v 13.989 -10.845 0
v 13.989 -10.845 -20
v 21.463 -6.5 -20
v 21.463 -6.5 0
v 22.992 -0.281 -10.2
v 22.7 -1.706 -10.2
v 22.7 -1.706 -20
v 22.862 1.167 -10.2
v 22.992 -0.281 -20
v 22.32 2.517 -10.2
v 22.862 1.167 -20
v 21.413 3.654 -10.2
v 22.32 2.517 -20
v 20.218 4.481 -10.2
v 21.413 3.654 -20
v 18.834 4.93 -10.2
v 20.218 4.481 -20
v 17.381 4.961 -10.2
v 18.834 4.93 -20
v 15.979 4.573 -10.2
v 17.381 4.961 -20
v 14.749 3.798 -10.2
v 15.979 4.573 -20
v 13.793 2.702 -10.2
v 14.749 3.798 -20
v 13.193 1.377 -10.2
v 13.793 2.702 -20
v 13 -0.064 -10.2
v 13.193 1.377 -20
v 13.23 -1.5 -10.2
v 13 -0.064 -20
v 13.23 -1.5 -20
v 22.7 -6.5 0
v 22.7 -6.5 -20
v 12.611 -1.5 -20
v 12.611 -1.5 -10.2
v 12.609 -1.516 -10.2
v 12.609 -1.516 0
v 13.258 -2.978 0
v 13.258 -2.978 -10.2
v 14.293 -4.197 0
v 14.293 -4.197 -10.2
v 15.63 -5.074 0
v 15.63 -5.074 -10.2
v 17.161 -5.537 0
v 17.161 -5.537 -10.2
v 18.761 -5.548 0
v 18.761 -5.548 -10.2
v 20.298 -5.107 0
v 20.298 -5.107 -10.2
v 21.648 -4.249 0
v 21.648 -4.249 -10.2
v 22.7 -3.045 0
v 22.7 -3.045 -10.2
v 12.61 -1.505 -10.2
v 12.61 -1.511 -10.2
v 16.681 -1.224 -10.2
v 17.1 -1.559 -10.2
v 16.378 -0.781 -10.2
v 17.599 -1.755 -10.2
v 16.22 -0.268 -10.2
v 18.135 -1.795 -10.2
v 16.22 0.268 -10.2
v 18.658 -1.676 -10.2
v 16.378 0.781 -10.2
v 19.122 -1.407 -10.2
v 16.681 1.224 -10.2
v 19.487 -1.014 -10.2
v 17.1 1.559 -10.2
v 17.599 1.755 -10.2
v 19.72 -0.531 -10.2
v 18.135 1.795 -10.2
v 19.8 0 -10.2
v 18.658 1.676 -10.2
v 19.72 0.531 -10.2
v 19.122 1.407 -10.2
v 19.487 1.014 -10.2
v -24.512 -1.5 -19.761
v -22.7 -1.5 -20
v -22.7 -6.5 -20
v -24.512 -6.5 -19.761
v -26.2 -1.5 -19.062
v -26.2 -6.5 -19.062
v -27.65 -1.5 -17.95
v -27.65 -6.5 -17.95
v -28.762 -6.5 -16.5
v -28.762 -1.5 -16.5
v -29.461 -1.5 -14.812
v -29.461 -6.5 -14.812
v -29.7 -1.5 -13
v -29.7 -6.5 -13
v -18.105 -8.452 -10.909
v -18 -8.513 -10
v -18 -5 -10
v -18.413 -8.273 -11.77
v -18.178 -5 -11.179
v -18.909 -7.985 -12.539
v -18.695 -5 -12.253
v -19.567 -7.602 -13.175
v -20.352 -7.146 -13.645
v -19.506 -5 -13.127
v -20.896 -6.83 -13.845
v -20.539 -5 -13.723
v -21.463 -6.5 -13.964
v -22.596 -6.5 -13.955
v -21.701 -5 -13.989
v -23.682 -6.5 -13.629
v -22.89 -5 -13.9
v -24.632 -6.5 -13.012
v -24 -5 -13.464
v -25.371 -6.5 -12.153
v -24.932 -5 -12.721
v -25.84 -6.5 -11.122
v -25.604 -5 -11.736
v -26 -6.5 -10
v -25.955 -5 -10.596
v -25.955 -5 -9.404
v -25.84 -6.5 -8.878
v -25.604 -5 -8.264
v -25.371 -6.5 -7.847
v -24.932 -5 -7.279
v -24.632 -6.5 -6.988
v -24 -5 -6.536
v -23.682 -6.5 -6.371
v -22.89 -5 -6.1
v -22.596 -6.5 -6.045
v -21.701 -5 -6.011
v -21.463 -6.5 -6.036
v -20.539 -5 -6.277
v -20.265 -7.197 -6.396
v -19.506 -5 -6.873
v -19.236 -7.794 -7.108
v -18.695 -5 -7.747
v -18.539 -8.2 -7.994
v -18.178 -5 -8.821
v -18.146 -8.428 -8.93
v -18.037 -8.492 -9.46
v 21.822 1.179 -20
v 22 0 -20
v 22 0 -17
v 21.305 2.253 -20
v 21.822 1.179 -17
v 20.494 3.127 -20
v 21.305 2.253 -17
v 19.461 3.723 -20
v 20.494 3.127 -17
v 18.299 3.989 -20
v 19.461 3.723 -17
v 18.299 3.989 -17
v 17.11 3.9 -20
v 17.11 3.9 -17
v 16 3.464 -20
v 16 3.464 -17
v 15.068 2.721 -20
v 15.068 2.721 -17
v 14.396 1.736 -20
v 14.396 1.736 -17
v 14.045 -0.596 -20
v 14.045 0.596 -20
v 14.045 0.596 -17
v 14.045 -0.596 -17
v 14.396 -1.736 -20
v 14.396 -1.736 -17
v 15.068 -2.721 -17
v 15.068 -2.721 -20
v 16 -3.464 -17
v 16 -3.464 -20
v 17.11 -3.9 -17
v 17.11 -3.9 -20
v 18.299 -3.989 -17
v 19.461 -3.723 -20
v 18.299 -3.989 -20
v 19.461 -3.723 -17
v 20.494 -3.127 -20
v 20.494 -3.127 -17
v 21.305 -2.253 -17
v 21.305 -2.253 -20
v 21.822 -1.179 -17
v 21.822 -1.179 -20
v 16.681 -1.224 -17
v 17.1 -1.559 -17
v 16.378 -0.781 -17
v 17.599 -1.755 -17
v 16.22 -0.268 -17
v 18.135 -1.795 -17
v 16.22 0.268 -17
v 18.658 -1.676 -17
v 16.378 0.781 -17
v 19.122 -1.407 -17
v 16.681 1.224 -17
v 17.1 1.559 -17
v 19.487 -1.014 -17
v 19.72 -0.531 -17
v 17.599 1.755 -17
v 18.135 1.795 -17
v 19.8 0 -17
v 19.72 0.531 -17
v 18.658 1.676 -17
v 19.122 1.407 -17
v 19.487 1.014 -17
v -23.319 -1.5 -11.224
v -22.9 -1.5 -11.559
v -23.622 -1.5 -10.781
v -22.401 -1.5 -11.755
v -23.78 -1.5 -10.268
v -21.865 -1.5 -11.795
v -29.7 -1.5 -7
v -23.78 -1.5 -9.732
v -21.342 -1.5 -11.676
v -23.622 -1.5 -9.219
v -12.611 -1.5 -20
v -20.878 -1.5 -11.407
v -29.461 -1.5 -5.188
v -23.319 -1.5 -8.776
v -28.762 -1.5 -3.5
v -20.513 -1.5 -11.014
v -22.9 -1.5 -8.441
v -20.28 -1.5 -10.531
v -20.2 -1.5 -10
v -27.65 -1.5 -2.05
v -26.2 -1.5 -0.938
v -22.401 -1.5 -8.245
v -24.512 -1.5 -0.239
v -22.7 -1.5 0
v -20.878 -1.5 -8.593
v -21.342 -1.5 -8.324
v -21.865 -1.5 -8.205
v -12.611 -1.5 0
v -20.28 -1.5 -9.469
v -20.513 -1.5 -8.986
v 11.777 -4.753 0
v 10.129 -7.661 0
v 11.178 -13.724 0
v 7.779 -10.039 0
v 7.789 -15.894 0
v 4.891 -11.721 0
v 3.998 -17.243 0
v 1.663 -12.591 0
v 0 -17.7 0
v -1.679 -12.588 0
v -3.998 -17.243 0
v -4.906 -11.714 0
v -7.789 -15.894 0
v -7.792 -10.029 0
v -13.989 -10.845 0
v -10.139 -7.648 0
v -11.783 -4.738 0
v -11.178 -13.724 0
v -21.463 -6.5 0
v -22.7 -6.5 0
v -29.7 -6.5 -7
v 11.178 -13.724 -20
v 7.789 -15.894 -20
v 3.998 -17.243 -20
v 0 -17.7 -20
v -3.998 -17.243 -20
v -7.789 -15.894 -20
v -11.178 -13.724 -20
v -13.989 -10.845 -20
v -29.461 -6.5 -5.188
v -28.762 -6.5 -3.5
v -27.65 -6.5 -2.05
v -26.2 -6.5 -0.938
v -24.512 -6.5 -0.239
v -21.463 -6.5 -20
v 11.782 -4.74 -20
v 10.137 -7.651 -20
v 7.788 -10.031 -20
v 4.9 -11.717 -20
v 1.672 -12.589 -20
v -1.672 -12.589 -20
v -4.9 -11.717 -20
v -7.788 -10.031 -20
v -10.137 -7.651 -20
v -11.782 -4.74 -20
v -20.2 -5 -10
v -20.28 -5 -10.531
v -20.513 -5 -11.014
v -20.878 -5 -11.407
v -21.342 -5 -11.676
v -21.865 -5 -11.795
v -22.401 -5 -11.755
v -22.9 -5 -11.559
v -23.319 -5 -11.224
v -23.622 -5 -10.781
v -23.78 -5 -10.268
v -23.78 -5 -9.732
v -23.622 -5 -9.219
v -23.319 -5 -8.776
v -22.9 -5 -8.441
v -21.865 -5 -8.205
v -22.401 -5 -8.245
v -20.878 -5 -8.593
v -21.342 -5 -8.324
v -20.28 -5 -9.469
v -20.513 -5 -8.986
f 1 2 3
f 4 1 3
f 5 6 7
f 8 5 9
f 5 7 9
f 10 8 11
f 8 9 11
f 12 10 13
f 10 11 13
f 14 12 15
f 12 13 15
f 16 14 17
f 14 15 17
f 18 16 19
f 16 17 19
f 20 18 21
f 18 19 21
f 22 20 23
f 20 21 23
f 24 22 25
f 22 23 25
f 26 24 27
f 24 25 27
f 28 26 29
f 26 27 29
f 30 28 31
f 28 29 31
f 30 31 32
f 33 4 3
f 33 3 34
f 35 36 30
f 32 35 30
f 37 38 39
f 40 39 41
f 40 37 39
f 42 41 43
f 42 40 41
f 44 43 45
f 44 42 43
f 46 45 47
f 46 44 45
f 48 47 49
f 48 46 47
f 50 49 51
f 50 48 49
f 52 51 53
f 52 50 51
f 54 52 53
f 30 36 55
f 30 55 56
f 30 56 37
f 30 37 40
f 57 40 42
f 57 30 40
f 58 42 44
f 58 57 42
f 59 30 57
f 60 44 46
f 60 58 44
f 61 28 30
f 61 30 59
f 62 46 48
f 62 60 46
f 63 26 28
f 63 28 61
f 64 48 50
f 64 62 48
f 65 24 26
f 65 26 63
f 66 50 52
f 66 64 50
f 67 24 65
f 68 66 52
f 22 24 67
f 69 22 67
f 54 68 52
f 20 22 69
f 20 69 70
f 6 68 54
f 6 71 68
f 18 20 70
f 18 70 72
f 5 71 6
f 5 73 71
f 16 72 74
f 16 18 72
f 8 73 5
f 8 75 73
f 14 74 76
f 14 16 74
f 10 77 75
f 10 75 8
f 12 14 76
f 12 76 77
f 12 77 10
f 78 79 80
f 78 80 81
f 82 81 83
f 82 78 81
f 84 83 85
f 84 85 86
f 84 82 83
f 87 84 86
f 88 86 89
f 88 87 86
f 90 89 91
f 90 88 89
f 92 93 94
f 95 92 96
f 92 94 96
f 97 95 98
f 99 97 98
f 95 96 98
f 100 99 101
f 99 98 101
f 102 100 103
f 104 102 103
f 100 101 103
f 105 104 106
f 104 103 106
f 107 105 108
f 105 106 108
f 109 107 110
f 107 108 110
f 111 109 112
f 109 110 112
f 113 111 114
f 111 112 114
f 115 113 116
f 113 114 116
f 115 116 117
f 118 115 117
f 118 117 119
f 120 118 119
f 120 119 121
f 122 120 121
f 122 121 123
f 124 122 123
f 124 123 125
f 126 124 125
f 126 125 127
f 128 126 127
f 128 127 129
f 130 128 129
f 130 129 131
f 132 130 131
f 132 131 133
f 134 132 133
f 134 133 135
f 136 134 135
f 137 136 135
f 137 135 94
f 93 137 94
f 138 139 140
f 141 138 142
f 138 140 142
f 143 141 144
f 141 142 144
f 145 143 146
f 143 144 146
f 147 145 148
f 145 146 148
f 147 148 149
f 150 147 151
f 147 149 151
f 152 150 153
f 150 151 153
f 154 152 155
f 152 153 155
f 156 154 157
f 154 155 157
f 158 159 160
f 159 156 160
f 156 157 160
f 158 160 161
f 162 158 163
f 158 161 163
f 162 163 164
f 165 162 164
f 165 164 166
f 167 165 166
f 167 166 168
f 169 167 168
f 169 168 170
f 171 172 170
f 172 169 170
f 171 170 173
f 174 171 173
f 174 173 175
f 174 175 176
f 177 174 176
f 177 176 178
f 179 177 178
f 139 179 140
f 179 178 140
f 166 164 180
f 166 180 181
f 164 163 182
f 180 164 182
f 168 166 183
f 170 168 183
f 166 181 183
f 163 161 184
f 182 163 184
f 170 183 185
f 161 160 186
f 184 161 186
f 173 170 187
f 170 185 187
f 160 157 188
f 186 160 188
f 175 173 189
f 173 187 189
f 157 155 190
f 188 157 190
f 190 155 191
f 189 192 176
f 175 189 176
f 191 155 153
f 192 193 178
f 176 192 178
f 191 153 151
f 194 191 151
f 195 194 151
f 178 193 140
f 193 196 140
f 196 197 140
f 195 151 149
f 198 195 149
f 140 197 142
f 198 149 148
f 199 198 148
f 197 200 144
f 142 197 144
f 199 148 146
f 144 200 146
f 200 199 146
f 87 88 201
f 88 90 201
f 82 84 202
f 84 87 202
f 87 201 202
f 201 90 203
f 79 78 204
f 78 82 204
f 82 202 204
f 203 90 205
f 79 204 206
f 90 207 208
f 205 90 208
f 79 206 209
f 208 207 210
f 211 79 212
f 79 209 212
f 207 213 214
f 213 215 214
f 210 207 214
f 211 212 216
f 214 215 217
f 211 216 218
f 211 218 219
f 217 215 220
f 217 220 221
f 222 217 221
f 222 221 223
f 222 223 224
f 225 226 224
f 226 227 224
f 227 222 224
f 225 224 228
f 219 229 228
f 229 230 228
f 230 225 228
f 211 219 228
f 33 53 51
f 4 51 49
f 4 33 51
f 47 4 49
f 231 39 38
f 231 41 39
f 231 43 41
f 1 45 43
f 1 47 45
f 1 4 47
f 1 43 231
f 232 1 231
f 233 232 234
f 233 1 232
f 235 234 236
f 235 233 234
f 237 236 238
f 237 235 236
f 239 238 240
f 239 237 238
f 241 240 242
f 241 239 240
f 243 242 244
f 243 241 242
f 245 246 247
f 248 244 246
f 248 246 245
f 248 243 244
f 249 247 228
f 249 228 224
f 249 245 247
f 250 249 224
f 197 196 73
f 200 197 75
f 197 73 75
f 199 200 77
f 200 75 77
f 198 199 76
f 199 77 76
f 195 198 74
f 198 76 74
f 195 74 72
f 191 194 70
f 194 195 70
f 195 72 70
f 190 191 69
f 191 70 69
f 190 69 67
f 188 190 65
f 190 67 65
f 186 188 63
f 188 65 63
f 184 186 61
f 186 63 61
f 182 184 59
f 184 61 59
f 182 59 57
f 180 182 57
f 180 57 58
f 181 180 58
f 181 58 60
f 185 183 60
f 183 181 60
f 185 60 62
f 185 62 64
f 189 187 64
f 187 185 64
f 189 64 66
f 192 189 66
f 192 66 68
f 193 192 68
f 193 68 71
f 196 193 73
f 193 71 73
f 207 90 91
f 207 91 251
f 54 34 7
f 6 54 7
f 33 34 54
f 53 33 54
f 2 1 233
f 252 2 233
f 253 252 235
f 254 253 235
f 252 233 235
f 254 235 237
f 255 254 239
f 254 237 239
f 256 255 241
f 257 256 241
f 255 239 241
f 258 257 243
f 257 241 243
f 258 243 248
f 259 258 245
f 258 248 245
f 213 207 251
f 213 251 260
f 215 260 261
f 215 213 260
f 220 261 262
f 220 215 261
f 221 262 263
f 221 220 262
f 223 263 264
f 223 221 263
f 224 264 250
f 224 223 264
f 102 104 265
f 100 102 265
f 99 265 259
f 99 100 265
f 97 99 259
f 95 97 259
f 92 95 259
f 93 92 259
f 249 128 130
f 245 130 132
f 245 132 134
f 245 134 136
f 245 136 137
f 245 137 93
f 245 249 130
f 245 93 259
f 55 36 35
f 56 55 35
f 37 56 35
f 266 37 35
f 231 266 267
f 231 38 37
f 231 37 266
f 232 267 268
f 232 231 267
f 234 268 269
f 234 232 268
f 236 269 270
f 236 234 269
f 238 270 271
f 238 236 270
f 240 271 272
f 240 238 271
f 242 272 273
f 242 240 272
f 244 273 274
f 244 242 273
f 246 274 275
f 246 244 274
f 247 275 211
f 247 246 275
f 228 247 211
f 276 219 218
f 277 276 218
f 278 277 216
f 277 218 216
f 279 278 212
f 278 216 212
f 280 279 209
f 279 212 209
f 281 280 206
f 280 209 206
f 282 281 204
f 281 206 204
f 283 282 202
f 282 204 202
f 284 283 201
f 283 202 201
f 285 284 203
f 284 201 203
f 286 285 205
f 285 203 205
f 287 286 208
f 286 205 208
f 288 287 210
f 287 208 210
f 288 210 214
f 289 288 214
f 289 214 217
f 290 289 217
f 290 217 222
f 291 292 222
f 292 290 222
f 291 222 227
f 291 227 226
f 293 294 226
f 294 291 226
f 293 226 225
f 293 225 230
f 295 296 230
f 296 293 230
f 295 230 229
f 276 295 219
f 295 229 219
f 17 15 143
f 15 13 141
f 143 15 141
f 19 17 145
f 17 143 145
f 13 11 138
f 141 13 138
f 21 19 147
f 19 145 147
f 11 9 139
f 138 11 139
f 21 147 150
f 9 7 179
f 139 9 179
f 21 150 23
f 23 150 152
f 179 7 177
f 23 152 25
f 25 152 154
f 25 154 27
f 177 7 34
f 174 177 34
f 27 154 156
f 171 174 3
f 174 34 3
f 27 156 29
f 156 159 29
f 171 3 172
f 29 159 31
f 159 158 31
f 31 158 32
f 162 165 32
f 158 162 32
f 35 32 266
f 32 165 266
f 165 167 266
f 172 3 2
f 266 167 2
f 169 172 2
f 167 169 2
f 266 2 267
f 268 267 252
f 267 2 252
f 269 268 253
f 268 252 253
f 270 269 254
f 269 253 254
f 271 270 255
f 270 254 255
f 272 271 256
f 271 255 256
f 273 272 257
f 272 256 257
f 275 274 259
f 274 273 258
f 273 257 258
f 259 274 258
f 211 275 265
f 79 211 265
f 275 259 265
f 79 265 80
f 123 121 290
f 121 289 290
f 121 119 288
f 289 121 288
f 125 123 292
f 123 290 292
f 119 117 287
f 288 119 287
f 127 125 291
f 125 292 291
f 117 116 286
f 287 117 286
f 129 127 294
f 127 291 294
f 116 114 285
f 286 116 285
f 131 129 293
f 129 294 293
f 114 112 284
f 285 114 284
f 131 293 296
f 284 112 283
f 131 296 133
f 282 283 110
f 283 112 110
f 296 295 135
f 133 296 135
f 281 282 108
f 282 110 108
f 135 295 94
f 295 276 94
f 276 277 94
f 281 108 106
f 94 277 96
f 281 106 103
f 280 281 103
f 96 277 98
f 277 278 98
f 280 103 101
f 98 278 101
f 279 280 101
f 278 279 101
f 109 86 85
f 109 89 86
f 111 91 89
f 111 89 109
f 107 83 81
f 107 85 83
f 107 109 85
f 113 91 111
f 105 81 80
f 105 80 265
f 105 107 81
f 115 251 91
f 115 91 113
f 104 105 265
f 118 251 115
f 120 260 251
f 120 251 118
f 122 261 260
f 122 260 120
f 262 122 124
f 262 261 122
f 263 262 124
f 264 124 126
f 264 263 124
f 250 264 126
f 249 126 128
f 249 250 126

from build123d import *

# Parameters (mm, degrees)
CYLINDER010_R     = 5.6
CYLINDER010_DEPTH = 10.2
CYLINDER007_R     = 4
CYLINDER007_DEPTH = 20
CYLINDER006_R     = 1.8
CYLINDER006_DEPTH = 20
CYLINDER001_R     = 4
CYLINDER001_DEPTH = 20
CYLINDER_R        = 1.8
CYLINDER_DEPTH    = 20
PAD_DEPTH         = 20
PAD001_DEPTH      = 5
CYLINDER009_R     = 5
CYLINDER009_DEPTH = 9.8


with BuildPart() as horizontal_body_space:
    # Cylinder010 → Cylinder010 (new body)
    with BuildSketch(Plane(origin=(18, 0, 9.8), x_dir=(1, 0, 0), z_dir=(0, 0, 1))):
        Circle(CYLINDER010_R)
    extrude(amount=CYLINDER010_DEPTH)


with BuildPart() as part_mirroring002:
    # Part__Mirroring002: instance of horizontal body space
    add(horizontal_body_space.part.mirror(Plane(origin=(0, 0, 10), x_dir=(0, 1, 0), z_dir=(0, 0, 1))))


with BuildPart() as horizontal_bolt_head_hole:
    # Cylinder007 → Cylinder007 (new body)
    with BuildSketch(Plane.XY.offset(17)):
        Circle(CYLINDER007_R)
    extrude(amount=CYLINDER007_DEPTH)


with BuildPart() as horizontal_bolt_hole_fusion:
    # Cylinder006 → Cylinder006 (new body)
    with BuildSketch(Plane.XY):
        Circle(CYLINDER006_R)
    extrude(amount=CYLINDER006_DEPTH)

    # Fusion003: union horizontal bolt head hole
    add(horizontal_bolt_head_hole.part)


with BuildPart() as horizontal_bolt_hole_fusion_1:
    # Fusion003 placement: moved
    add(horizontal_bolt_hole_fusion.part.moved(Location((18, 0, 0))))


with BuildPart() as bolt_head_hole:
    # Cylinder001 → Cylinder001 (new body)
    with BuildSketch(Plane.XZ):
        Circle(CYLINDER001_R)
    extrude(amount=CYLINDER001_DEPTH)


with BuildPart() as fusion005:
    # Cylinder → Cylinder (new body)
    with BuildSketch(Plane.XZ.offset(-10)):
        Circle(CYLINDER_R)
    extrude(amount=CYLINDER_DEPTH)

    # Fusion: union bolt head hole
    add(bolt_head_hole.part)


with BuildPart() as fusion005_1:
    # Fusion placement: moved
    add(fusion005.part.moved(Location((-22, -5, 10))))

    # Fusion005: union Part__Mirroring002, horizontal bolt hole fusion
    add(part_mirroring002.part)
    add(horizontal_bolt_hole_fusion_1.part)


with BuildPart() as f_25_mm_attachment_body:
    # Sketch → Pad (new body)
    with BuildSketch(Plane.XY):
        with BuildLine():
            ThreePointArc((12.611106, 1.5), (0, 12.7), (-12.611106, 1.5))
            Line((-22.7, 1.5), (-12.611106, 1.5))
            Line((-22.7, 1.5), (-22.7, 6.5))
            Line((-22.7, 6.5), (-21.463293, 6.5))
            Line((-21.463293, 6.5), (-13.988671, 10.84468))
            ThreePointArc((13.988671, 10.84468), (0, 17.7), (-13.988671, 10.84468))
            Line((13.988671, 10.84468), (21.463293, 6.5))
            Line((21.463293, 6.5), (22.7, 6.5))
            Line((22.7, 6.5), (22.7, 1.5))
            Line((12.611106, 1.5), (22.7, 1.5))
        make_face()
    extrude(amount=PAD_DEPTH)

    # Sketch001 → Pad001 (join)
    with BuildSketch(Plane.XZ.offset(-1.5)):
        with BuildLine():
            Line((-12.611106, 20), (-22.7, 20))
            ThreePointArc((-22.7, 20), (-27.649747, 17.949747), (-29.7, 13))
            Line((-29.7, 13), (-29.7, 7))
            ThreePointArc((-29.7, 7), (-27.649747, 2.050253), (-22.7, 0))
            Line((-12.611106, 0), (-22.7, 0))
            Line((-12.611106, 20), (-12.611106, 0))
        make_face()
    extrude(amount=-PAD001_DEPTH)


with BuildPart() as part_mirroring:
    # Part__Mirroring: instance of 25 mm attachment body
    add(f_25_mm_attachment_body.part.mirror(Plane(origin=(0, 0, 0), x_dir=(1, 0, 0), z_dir=(0, 1, 0))))


with BuildPart() as horizontal_body:
    # Cylinder009 → Cylinder009 (new body)
    with BuildSketch(Plane(origin=(18, 0, 0), x_dir=(1, 0, 0), z_dir=(0, 0, 1))):
        Circle(CYLINDER009_R)
    extrude(amount=CYLINDER009_DEPTH)


with BuildPart() as f_25_mm_attachment_holed_clone:
    # Part__Mirroring001: instance of horizontal body
    add(horizontal_body.part.mirror(Plane(origin=(0, 0, 10), x_dir=(0, 1, 0), z_dir=(0, 0, 1))))

    # Fusion004: union Part__Mirroring
    add(part_mirroring.part)

    # Cut: cut Fusion005
    add(fusion005_1.part, mode=Mode.SUBTRACT)


with BuildPart() as part_mirroring004:
    # Part__Mirroring004: instance of 25 mm attachment holed clone
    add(f_25_mm_attachment_holed_clone.part.mirror(Plane(origin=(0, 0, 0), x_dir=(0, 1, 0), z_dir=(0, 0, 1))))


solid = part_mirroring004.part
